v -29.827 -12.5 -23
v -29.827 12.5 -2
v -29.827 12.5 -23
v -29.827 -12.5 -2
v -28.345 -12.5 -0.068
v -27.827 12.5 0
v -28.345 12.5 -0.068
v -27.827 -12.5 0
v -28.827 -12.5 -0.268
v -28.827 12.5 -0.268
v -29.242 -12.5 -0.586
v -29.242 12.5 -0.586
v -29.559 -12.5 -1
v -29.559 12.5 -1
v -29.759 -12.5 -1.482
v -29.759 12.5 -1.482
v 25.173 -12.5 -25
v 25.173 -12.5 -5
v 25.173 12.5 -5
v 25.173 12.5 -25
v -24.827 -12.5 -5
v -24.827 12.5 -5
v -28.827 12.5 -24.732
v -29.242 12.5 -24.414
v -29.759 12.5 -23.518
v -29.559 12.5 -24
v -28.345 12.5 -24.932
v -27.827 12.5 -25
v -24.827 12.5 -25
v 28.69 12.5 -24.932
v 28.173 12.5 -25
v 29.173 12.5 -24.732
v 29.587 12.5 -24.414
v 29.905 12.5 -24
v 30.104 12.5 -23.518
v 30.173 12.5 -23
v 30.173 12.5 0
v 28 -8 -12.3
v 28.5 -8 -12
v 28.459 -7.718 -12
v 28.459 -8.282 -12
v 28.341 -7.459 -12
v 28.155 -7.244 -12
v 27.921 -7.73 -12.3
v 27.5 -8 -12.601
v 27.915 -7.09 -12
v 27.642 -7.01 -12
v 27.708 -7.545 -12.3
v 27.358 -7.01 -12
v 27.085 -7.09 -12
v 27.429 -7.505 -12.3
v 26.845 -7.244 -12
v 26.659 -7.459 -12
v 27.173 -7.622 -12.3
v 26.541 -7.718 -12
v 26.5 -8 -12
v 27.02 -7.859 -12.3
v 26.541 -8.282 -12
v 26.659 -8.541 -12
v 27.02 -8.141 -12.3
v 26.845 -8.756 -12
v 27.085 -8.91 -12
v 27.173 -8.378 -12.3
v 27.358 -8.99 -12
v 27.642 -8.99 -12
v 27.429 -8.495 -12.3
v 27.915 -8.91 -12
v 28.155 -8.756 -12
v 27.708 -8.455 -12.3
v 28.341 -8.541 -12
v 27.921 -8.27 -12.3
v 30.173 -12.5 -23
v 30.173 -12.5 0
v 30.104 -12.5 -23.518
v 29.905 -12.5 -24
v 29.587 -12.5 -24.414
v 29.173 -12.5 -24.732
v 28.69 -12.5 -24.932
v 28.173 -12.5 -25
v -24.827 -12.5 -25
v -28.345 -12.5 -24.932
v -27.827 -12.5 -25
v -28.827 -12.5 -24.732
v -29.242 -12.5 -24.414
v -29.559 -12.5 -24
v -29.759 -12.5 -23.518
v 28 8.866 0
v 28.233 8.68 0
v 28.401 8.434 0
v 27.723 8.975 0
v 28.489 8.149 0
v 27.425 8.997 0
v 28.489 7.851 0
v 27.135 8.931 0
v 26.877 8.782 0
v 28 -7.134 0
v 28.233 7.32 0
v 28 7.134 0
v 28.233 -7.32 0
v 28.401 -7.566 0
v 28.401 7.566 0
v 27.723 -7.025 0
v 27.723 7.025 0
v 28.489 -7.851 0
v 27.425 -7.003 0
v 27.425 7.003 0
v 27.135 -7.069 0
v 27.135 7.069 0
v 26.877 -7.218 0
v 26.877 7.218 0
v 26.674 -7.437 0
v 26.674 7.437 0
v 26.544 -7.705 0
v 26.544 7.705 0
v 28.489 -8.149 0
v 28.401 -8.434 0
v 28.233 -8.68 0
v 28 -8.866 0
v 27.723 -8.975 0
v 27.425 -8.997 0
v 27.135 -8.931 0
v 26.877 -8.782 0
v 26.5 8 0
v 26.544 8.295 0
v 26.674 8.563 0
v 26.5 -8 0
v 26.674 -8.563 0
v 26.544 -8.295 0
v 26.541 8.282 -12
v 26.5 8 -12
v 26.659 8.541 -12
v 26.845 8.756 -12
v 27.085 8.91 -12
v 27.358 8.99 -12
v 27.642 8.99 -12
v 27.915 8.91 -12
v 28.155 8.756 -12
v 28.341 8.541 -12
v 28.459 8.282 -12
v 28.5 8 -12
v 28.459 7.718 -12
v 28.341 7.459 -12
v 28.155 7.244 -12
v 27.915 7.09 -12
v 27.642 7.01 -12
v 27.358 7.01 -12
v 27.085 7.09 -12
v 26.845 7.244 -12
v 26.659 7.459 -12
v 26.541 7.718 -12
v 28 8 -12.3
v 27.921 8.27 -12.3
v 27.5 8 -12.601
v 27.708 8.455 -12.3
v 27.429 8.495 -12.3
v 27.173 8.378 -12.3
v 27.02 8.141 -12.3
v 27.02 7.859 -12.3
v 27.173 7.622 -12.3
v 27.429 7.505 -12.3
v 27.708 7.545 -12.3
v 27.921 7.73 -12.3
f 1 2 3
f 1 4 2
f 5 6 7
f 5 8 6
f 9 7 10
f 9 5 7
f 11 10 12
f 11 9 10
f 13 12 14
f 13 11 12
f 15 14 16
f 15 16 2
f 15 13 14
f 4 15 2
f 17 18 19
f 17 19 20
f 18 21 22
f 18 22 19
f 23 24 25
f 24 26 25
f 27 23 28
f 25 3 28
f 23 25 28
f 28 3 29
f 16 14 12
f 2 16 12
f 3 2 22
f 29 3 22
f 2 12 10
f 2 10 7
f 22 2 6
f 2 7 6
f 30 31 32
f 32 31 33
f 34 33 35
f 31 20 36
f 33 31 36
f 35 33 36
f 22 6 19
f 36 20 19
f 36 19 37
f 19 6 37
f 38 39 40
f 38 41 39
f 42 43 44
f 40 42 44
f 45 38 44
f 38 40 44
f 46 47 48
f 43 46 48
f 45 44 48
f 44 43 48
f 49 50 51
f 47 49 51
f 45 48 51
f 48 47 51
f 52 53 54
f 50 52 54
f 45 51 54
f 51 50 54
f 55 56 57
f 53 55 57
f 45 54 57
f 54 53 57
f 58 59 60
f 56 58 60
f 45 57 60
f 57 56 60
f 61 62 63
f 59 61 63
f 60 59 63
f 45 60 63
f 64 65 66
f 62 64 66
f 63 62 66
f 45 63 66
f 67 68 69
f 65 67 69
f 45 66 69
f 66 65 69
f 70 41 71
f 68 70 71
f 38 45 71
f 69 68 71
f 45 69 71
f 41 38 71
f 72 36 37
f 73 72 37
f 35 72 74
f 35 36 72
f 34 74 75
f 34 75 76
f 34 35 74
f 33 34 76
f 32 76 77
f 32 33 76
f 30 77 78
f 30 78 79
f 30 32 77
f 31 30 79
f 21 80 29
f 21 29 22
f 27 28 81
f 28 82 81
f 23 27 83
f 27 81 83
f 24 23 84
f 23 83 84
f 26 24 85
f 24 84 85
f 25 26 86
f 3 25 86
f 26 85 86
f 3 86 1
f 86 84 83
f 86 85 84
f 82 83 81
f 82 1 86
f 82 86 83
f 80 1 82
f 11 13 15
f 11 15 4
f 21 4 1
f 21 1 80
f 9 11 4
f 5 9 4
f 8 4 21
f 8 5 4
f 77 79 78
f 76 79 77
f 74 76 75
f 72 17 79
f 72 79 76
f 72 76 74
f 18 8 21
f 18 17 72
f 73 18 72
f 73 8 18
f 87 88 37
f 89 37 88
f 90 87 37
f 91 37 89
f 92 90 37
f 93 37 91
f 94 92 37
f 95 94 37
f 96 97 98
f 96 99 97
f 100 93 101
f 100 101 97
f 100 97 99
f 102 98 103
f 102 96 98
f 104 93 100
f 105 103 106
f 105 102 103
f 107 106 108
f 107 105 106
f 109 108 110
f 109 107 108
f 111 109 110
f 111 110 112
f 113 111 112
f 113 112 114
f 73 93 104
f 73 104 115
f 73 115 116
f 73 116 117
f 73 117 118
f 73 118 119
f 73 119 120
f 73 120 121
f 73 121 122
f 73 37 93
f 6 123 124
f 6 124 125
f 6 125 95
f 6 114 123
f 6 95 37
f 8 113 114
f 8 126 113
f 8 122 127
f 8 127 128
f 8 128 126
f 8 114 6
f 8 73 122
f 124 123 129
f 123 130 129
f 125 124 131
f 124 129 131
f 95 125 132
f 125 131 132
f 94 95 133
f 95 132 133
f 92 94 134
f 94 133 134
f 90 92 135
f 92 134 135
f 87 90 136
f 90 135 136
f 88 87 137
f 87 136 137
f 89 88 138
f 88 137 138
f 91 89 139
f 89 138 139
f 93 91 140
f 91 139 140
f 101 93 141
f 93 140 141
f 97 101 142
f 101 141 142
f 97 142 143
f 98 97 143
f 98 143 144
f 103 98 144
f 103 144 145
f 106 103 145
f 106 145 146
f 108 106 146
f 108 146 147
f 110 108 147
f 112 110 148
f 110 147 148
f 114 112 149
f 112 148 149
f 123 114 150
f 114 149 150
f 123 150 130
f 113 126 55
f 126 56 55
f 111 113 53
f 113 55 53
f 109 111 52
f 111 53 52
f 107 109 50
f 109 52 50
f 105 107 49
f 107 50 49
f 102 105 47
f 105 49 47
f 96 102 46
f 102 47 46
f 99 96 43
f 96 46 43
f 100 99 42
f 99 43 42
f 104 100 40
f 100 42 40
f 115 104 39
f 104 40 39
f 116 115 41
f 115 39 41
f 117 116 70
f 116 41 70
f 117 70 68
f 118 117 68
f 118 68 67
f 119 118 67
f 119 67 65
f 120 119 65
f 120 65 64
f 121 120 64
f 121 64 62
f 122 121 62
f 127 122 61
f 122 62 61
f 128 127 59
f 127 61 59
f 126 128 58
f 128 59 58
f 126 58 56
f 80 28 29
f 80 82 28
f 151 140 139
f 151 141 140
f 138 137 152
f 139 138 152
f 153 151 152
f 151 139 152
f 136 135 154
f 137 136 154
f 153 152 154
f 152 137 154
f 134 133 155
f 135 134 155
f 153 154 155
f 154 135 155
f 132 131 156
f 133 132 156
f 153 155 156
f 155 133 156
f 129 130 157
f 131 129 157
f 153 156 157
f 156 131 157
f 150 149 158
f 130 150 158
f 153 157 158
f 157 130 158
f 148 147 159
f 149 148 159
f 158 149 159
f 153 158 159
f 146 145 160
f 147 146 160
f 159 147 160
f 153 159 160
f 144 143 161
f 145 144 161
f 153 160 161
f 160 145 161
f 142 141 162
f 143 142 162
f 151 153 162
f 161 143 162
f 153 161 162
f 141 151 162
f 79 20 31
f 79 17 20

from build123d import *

# Parameters (mm, degrees)
F1_DEPTH = 12.5
F3_R     = 2
F4_D     = 2
F4_DEPTH = 12
F4_TIP   = 0.600860619


# Not quite as in the source:
# - a feature names something its author has since deleted; it is built from what else it names


with BuildPart() as f1:
    # F0 (on Front) → F1 (new body, symmetric)
    with BuildSketch(Plane.XZ):
        Polygon((30.1726347237, 0), (-29.8273652763, 0), (-29.8273652763, -25), (-24.8273652763, -25), (-24.8273652763, -5), (25.1726347237, -5), (25.1726347237, -25), (30.1726347237, -25), align=None)
    extrude(amount=F1_DEPTH, both=True)

    # F3
    f3_edges = [f1.edges().sort_by_distance(p)[0] for p in [
        (30.172635, 0, -25),
        (-29.827365, 0, -25),
        (-29.827365, 0, 0),
    ]]
    fillet(f3_edges, radius=F3_R)

    # F4
    with Locations(Plane.XY):
        with Locations((27.5, 8), (27.5, -8)):
            Hole(F4_D / 2, depth=F4_DEPTH)
            with Locations((0, 0, -(F4_DEPTH + F4_TIP / 2))):  # 118° drill point
                Cone(0, F4_D / 2, F4_TIP, mode=Mode.SUBTRACT)


solid = f1.part
